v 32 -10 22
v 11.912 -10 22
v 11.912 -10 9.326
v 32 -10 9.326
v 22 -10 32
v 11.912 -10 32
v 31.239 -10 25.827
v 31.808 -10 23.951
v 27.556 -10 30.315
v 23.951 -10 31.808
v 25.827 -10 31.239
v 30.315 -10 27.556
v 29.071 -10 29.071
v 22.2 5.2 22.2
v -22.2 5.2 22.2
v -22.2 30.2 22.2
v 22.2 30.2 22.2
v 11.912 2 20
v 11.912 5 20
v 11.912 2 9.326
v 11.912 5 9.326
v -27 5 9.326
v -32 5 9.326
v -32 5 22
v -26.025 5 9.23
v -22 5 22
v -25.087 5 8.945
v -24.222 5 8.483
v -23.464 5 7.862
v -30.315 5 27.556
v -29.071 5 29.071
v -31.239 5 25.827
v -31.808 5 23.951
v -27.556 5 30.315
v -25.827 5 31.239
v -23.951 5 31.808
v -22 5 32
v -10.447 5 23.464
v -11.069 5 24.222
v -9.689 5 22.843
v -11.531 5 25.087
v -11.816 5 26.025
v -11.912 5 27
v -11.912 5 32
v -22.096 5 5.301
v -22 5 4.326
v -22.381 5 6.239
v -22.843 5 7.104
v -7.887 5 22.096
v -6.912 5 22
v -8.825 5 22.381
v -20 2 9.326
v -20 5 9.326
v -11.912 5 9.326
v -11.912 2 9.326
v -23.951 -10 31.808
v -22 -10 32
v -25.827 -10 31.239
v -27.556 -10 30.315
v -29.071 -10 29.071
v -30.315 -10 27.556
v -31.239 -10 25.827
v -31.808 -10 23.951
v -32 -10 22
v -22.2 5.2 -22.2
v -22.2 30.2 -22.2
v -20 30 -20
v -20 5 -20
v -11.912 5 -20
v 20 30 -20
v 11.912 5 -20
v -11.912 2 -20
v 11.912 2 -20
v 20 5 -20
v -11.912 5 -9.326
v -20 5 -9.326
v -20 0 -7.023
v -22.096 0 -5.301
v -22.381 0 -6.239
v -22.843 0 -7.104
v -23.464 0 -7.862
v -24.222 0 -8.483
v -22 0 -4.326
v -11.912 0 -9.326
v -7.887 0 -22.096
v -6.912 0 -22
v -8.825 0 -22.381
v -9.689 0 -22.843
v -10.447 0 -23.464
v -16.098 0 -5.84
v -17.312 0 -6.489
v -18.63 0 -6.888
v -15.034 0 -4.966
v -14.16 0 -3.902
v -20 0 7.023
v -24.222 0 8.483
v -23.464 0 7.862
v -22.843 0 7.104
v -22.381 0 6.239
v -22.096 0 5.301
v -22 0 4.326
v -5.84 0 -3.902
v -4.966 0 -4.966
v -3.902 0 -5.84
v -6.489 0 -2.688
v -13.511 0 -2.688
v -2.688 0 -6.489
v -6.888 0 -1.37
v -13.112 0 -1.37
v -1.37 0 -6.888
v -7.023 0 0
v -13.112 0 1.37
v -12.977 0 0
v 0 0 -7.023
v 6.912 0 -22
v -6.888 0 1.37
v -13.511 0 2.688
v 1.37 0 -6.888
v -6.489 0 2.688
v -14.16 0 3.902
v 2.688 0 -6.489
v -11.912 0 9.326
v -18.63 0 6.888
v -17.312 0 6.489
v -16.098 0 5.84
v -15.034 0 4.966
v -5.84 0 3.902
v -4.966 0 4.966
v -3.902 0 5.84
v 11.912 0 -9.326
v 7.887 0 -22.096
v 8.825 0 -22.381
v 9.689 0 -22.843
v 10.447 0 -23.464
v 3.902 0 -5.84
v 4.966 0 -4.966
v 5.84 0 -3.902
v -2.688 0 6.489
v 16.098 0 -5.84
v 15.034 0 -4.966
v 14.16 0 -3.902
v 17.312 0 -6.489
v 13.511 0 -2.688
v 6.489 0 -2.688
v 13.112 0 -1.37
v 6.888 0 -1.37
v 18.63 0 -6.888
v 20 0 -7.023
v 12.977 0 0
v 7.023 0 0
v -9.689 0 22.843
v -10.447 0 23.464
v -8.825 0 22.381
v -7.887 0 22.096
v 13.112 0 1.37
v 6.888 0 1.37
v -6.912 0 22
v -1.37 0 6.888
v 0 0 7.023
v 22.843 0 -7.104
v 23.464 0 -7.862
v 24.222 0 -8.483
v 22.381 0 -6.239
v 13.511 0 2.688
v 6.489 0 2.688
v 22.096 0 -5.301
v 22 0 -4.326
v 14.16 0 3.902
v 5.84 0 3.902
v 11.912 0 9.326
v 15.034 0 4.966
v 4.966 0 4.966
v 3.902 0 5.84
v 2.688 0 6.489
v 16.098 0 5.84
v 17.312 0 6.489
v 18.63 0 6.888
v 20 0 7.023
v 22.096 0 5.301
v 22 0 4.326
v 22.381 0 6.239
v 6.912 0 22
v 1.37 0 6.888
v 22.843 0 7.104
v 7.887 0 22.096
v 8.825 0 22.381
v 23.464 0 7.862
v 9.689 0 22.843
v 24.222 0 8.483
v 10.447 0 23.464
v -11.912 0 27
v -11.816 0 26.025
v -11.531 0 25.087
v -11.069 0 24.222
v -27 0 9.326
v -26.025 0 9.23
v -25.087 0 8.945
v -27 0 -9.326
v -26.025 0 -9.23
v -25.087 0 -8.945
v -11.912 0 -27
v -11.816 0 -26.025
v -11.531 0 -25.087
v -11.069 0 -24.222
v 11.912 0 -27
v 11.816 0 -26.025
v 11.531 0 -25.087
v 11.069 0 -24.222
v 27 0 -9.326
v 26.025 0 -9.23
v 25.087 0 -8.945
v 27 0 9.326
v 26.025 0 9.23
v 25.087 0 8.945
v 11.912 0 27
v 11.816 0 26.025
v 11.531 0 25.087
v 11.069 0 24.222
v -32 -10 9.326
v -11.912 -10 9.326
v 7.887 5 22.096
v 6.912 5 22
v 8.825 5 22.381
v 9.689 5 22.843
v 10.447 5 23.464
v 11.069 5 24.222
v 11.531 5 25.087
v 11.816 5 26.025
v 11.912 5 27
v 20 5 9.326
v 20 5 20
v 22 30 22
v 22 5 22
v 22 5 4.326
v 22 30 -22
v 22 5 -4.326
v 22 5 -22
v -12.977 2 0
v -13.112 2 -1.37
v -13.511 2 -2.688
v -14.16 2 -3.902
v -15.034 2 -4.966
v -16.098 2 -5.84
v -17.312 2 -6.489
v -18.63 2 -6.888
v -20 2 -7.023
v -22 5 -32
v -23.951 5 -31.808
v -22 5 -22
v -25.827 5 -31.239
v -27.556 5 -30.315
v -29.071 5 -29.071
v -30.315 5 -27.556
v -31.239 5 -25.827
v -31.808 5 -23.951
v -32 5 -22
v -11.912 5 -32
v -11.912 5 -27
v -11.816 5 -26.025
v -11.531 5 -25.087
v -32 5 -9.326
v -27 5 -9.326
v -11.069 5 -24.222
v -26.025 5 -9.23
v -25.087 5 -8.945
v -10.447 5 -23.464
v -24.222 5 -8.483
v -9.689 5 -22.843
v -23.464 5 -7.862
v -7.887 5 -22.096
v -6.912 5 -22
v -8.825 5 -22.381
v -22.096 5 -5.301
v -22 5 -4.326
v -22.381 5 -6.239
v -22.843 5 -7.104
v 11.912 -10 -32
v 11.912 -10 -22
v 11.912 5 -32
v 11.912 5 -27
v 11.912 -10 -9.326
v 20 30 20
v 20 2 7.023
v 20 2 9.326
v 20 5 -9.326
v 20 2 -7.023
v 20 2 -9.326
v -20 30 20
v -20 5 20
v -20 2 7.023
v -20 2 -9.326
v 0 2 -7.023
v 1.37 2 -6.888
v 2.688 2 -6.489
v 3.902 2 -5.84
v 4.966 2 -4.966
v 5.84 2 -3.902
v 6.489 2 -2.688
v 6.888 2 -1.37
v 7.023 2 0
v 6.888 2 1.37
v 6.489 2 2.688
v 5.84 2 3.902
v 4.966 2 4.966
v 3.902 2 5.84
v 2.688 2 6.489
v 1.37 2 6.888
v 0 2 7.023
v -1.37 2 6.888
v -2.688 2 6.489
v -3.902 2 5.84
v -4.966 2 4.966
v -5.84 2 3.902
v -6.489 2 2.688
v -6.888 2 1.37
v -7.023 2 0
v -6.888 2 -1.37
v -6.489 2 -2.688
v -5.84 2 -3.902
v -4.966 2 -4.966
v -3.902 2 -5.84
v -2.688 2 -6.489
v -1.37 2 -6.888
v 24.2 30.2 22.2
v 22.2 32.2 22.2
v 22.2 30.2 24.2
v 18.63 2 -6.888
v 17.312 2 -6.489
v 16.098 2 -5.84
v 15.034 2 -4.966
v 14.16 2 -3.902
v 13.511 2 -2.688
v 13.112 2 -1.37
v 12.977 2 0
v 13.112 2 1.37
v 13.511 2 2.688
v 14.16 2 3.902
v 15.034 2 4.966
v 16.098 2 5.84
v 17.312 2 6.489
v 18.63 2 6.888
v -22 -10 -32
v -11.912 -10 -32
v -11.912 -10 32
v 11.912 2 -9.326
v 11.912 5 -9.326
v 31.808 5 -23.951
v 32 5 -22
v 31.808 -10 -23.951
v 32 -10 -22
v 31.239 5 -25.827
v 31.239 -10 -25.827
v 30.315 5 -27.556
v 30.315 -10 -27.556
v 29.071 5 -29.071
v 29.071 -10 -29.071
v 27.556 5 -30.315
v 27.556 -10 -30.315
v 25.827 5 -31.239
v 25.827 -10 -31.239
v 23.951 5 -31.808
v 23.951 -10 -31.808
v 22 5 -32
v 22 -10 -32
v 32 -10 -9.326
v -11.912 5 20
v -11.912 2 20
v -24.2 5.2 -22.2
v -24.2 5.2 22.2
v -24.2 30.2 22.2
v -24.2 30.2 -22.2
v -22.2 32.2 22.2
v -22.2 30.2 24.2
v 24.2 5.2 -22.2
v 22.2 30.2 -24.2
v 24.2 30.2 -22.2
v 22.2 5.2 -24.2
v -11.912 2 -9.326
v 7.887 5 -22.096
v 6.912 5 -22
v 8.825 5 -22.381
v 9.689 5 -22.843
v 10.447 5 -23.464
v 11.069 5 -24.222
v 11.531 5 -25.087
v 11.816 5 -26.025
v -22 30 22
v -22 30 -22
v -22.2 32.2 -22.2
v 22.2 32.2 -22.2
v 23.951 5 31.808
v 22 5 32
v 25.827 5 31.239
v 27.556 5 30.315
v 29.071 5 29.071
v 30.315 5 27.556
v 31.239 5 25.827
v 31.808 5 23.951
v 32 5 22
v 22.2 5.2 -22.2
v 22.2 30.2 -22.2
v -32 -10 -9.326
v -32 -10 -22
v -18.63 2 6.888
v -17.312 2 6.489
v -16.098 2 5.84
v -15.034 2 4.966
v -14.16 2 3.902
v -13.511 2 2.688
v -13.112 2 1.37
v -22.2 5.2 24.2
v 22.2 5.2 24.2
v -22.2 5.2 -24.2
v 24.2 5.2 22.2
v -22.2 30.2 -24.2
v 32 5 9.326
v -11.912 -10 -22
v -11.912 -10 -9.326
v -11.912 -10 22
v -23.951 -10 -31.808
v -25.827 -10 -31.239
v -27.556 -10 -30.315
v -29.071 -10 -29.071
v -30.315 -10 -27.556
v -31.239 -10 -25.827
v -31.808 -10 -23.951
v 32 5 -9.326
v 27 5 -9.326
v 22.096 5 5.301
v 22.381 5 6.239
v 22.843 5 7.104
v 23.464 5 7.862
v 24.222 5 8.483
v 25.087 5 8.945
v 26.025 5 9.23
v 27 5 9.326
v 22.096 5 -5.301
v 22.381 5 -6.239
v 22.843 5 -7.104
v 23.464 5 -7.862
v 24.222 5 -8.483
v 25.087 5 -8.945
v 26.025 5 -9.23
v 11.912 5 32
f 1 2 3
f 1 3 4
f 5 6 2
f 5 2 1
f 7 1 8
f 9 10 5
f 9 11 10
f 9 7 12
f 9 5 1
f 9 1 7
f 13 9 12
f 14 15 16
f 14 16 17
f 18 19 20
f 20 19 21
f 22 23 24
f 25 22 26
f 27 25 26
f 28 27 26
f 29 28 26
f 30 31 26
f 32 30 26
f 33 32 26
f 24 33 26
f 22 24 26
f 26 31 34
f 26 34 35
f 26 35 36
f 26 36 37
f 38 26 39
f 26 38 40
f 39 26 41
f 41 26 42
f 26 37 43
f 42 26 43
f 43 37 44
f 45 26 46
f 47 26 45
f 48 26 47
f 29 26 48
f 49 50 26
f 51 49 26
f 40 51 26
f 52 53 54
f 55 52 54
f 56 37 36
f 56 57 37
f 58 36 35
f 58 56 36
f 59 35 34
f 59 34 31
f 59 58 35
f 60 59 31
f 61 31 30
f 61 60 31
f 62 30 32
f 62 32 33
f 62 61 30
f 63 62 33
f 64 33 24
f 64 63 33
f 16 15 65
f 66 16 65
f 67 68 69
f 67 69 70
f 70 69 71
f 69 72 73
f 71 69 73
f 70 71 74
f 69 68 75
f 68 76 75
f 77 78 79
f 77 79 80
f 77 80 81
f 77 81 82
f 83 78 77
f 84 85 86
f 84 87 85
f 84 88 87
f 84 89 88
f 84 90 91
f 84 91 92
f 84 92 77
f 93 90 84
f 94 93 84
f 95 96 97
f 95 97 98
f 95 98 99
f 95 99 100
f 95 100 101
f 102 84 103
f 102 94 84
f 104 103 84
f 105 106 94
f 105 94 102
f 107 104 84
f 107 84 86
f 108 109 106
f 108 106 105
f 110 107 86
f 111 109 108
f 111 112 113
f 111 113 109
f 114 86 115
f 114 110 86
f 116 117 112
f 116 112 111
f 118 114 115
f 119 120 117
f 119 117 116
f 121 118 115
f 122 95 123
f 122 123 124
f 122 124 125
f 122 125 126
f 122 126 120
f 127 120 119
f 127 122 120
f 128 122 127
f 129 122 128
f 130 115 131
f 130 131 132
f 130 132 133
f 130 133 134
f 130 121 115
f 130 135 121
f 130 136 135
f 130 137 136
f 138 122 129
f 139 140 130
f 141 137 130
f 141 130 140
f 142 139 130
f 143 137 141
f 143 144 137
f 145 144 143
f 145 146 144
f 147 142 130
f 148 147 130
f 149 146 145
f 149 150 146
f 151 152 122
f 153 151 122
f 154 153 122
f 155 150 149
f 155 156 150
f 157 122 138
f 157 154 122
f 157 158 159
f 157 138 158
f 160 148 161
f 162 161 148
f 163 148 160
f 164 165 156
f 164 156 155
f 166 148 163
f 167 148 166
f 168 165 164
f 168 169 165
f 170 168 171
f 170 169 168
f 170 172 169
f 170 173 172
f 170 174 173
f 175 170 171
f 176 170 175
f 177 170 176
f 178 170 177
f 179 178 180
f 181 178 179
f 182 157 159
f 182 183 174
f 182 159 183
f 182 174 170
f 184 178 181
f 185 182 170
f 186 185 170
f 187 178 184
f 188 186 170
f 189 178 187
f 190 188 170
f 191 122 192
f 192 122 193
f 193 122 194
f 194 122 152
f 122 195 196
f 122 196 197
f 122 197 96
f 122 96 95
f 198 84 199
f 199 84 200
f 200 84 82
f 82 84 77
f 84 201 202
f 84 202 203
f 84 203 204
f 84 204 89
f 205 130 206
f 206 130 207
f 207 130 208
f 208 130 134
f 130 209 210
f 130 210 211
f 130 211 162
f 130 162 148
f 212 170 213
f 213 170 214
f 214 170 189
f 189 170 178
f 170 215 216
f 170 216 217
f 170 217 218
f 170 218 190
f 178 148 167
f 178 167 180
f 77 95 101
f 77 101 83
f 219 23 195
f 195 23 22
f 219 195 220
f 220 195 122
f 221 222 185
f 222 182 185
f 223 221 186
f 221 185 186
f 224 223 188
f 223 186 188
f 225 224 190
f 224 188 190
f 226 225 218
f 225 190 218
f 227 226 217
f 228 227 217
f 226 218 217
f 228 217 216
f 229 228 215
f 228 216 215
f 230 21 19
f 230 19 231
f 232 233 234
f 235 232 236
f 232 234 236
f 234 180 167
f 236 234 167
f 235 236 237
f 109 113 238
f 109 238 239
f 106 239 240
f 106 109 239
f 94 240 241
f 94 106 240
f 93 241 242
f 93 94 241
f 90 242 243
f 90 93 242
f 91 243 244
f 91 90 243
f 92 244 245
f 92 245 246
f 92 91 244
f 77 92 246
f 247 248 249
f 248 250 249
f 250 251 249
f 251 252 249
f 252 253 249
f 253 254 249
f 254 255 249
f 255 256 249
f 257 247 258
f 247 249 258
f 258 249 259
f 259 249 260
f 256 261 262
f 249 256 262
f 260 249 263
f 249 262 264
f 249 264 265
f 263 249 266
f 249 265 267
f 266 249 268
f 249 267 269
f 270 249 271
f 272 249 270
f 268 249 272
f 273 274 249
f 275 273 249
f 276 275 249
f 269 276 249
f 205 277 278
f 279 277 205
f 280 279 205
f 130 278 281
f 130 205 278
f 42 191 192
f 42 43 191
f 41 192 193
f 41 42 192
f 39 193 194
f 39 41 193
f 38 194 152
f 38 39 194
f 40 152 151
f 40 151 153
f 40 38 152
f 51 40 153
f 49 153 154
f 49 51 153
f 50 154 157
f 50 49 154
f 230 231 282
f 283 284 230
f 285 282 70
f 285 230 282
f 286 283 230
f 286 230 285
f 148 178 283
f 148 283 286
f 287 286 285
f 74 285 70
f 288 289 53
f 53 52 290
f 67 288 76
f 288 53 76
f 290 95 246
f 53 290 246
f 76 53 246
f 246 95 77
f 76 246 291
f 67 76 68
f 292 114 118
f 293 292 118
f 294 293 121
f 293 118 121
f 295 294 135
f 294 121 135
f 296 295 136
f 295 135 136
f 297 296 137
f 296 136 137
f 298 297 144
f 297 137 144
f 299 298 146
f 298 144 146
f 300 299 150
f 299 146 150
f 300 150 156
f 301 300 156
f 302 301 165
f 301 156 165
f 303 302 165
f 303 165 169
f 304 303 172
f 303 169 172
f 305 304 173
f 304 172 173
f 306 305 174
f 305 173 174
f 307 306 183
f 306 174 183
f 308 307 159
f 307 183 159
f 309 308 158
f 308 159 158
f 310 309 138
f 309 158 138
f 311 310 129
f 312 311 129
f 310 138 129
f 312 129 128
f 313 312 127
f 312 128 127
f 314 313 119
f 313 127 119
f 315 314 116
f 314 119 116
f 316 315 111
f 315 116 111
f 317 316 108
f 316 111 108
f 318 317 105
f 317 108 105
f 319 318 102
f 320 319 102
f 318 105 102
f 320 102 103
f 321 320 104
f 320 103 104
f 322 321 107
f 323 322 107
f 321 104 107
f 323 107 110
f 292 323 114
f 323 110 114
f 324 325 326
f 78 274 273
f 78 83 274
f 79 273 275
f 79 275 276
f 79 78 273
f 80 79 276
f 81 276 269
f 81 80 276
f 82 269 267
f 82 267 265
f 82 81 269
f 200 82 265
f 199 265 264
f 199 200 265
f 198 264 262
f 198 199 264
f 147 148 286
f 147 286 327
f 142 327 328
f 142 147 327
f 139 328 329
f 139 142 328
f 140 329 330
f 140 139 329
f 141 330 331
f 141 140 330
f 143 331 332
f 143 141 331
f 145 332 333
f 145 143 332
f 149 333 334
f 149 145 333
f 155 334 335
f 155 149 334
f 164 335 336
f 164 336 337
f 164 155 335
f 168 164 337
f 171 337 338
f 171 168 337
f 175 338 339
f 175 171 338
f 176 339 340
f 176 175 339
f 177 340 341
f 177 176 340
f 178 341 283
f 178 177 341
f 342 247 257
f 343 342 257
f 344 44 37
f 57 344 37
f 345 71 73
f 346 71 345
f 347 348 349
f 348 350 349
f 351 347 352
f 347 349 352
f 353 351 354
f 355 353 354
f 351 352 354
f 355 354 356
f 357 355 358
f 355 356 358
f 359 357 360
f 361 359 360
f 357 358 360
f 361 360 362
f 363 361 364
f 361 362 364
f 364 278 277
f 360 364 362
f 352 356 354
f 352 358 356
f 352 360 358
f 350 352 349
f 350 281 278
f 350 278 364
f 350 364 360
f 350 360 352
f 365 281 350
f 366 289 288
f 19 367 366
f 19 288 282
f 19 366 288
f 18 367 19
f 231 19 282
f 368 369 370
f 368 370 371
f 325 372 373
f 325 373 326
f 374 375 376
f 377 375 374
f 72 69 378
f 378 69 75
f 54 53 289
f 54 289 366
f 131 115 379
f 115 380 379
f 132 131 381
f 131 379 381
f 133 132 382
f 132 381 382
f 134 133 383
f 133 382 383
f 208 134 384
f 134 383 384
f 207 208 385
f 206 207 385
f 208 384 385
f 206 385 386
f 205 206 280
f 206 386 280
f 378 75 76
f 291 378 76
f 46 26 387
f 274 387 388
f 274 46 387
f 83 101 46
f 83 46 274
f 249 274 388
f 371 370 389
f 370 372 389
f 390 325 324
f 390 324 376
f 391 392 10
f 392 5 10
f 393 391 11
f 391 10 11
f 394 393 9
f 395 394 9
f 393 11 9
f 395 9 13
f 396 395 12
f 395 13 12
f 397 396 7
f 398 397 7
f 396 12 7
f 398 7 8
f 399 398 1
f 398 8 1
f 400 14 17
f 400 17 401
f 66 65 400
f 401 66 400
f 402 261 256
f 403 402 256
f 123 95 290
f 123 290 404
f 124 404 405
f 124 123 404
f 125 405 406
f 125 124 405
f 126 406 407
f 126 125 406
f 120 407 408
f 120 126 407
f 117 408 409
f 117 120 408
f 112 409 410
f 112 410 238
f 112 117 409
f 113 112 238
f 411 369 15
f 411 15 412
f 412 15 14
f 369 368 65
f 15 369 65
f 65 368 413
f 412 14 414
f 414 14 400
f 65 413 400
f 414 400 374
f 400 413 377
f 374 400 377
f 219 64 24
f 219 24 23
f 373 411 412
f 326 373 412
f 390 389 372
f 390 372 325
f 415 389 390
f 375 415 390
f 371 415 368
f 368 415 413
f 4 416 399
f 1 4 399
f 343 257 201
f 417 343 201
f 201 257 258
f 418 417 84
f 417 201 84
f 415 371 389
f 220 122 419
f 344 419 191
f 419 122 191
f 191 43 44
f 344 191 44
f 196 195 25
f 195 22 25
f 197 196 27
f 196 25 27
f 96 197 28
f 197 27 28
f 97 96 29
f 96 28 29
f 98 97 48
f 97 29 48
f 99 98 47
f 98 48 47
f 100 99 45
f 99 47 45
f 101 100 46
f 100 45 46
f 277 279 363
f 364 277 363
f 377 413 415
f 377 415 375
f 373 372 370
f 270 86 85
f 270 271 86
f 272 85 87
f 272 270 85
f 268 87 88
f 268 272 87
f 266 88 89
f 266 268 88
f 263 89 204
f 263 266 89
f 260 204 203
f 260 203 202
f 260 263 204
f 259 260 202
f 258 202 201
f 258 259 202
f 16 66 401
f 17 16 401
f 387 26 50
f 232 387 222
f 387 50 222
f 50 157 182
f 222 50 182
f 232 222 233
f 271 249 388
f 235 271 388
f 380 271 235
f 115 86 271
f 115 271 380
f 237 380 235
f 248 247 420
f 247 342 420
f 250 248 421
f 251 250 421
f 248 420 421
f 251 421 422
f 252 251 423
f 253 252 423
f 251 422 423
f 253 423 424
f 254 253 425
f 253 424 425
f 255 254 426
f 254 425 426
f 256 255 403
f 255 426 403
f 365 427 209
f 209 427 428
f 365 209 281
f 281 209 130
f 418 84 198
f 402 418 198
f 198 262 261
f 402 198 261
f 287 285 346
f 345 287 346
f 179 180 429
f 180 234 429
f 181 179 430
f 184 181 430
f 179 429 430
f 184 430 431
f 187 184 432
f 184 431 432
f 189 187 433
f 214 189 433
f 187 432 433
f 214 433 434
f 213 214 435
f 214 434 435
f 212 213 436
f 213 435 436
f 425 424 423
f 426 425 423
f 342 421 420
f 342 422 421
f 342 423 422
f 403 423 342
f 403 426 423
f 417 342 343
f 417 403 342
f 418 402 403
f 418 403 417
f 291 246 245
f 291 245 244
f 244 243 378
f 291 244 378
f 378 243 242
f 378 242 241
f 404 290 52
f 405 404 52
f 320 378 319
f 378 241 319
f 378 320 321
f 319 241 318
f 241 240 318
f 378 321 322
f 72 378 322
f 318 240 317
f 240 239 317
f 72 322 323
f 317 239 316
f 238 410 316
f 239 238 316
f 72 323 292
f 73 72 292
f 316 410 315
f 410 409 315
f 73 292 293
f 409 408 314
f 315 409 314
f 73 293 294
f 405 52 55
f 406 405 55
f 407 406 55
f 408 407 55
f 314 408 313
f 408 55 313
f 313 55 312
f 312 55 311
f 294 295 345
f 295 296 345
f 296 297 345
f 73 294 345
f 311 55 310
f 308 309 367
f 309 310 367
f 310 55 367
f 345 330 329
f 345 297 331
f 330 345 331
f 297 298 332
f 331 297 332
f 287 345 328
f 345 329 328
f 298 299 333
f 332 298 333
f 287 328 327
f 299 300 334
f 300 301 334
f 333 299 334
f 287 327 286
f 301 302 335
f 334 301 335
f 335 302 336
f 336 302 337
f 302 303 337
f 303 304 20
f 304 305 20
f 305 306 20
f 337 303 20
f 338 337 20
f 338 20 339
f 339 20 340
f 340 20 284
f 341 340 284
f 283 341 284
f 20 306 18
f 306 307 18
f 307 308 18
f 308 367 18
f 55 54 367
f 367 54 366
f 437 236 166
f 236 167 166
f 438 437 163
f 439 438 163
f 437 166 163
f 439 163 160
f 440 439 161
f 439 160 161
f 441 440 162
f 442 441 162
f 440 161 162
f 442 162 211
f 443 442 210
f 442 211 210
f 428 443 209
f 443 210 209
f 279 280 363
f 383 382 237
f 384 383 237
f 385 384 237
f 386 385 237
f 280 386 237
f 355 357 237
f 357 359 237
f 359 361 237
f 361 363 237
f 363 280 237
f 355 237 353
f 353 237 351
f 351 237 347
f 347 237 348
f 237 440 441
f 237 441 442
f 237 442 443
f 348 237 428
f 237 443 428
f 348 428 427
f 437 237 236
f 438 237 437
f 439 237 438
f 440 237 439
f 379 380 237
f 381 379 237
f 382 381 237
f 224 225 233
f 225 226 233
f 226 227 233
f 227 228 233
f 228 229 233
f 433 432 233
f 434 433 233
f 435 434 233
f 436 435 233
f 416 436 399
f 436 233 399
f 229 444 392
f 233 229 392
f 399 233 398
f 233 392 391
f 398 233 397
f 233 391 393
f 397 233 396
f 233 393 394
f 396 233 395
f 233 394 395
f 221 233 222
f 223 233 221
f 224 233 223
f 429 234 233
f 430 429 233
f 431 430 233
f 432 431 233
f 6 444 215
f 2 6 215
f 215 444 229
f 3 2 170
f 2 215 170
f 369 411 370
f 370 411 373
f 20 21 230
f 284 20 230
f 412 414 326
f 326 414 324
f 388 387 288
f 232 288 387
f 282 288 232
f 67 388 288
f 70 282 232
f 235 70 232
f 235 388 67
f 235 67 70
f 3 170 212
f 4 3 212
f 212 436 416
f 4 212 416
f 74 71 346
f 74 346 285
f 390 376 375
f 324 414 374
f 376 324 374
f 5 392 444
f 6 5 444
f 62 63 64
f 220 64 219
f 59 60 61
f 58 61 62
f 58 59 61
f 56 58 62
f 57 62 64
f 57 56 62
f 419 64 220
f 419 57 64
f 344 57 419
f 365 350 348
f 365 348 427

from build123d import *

# Parameters (mm, degrees)
SKETCH1_W           = 44
SKETCH1_H           = 44
SKETCH1_W_2         = 40
SKETCH1_H_2         = 40
EXTRUDE_THIN1_DEPTH = 30
SKETCH3_R           = 7.023320088
BOSS_EXTRUDE1_DEPTH = 2
BOSS_EXTRUDE2_START = -5
SKETCH4_W           = 10.088390541
SKETCH4_H           = 12.67398169
BOSS_EXTRUDE2_DEPTH = 15
EXTRUDE_THIN2_START = -24.8
SKETCH5_W           = 48.4
SKETCH5_H           = 48.4
SKETCH5_W_2         = 44.4
SKETCH5_H_2         = 44.4
EXTRUDE_THIN2_DEPTH = 25
SKETCH6_W           = 48.4
SKETCH6_H           = 48.4
BOSS_EXTRUDE3_DEPTH = 2
CHAMFER2_SIZE       = 2
FILLET1_R           = 10
FILLET2_R           = 5


with BuildPart() as part:
    # Sketch1 → Extrude-Thin1 (new body)
    with BuildSketch(Plane(origin=(0, 0, 0), x_dir=(1, 0, 0), z_dir=(0, 1, 0))):
        Rectangle(SKETCH1_W, SKETCH1_H)
        Rectangle(SKETCH1_W_2, SKETCH1_H_2, mode=Mode.SUBTRACT)
    extrude(amount=EXTRUDE_THIN1_DEPTH)

    # Sketch3 → Boss-Extrude1 (add)
    with BuildSketch(Plane.XZ):
        with BuildLine():
            Line((20, 20), (-20, 20))
            Line((-20, 20), (-20, 7.023320088))
            ThreePointArc((-20, 7.023320088), (-15.033762739, 4.966237261), (-12.976679912, 0))
            ThreePointArc((-12.976679912, 0), (-15.033762739, -4.966237261), (-20, -7.023320088))
            Line((-20, -7.023320088), (-20, -20))
            Line((-20, -20), (20, -20))
            Line((20, -20), (20, -7.023320088))
            ThreePointArc((20, -7.023320088), (12.976679912, 0), (20, 7.023320088))
            Line((20, 7.023320088), (20, 20))
        make_face()
        with Locations(Location((0, 0, 0), (0, 0, 270))):
            Circle(SKETCH3_R, mode=Mode.SUBTRACT)
    extrude(amount=-BOSS_EXTRUDE1_DEPTH)

    # Sketch4 → Boss-Extrude2 (add)
    with BuildSketch(Plane.XZ.offset(BOSS_EXTRUDE2_START)):
        Polygon((-11.911609459, 22), (-11.911609459, 32), (-32, 32), (-32, 9.32601831), (-22, 9.32601831), (-22, 22), align=None)
        Polygon((22, 9.32601831), (32, 9.32601831), (32, 32), (11.911609459, 32), (11.911609459, 22), (22, 22), align=None)
        Polygon((11.911609459, -32), (32, -32), (32, -9.32601831), (22, -9.32601831), (22, -22), (11.911609459, -22), align=None)
        with Locations((16.95580473, -15.663009155)):
            Rectangle(SKETCH4_W, SKETCH4_H)
        Polygon((-32, -32), (-11.911609459, -32), (-11.911609459, -22), (-22, -22), (-22, -9.32601831), (-32, -9.32601831), align=None)
        with Locations((-16.95580473, -15.663009155)):
            Rectangle(SKETCH4_W, SKETCH4_H)
        with Locations((-16.95580473, 15.663009155)):
            Rectangle(SKETCH4_W, SKETCH4_H)
        with Locations((16.95580473, 15.663009155)):
            Rectangle(SKETCH4_W, SKETCH4_H)
    extrude(amount=BOSS_EXTRUDE2_DEPTH)

    # Fillet1
    fillet1_edges = [part.edges().sort_by_distance(p)[0] for p in [
        (-32, -2.5, 32),
        (32, -2.5, 32),
        (32, -2.5, -32),
        (-32, -2.5, -32),
    ]]
    fillet(fillet1_edges, radius=FILLET1_R)

    # Fillet2
    fillet2_edges = [part.edges().sort_by_distance(p)[0] for p in [
        (-11.911609459, 2.5, 22),
        (-22, 2.5, 9.32601831),
        (11.911609459, 2.5, 22),
        (22, 2.5, 9.32601831),
        (22, 2.5, -9.32601831),
        (11.911609459, 2.5, -22),
        (-11.911609459, 2.5, -22),
        (-22, 2.5, -9.32601831),
    ]]
    fillet(fillet2_edges, radius=FILLET2_R)


with BuildPart() as body_2:
    # Sketch5 → Extrude-Thin2 (new body)
    with BuildSketch(Plane(origin=(0, 30, 0), x_dir=(1, 0, 0), z_dir=(0, 1, 0)).offset(EXTRUDE_THIN2_START)):
        Rectangle(SKETCH5_W, SKETCH5_H)
        Rectangle(SKETCH5_W_2, SKETCH5_H_2, mode=Mode.SUBTRACT)
    extrude(amount=EXTRUDE_THIN2_DEPTH)

    # Sketch6 → Boss-Extrude3 (add)
    with BuildSketch(Plane(origin=(0, 30.2, 0), x_dir=(1, 0, 0), z_dir=(0, 1, 0))):
        Rectangle(SKETCH6_W, SKETCH6_H)
    extrude(amount=BOSS_EXTRUDE3_DEPTH)

    # Chamfer2
    chamfer2_edges = [body_2.edges().sort_by_distance(p)[0] for p in [
        (-24.2, 18.7, -24.2),
        (24.2, 18.7, -24.2),
        (-24.2, 32.2, 0),
        (0, 32.2, 24.2),
        (24.2, 32.2, 0),
        (0, 32.2, -24.2),
        (24.2, 18.7, 24.2),
        (-24.2, 18.7, 24.2),
    ]]
    chamfer(chamfer2_edges, length=CHAMFER2_SIZE)


solid = Compound([part.part, body_2.part])
